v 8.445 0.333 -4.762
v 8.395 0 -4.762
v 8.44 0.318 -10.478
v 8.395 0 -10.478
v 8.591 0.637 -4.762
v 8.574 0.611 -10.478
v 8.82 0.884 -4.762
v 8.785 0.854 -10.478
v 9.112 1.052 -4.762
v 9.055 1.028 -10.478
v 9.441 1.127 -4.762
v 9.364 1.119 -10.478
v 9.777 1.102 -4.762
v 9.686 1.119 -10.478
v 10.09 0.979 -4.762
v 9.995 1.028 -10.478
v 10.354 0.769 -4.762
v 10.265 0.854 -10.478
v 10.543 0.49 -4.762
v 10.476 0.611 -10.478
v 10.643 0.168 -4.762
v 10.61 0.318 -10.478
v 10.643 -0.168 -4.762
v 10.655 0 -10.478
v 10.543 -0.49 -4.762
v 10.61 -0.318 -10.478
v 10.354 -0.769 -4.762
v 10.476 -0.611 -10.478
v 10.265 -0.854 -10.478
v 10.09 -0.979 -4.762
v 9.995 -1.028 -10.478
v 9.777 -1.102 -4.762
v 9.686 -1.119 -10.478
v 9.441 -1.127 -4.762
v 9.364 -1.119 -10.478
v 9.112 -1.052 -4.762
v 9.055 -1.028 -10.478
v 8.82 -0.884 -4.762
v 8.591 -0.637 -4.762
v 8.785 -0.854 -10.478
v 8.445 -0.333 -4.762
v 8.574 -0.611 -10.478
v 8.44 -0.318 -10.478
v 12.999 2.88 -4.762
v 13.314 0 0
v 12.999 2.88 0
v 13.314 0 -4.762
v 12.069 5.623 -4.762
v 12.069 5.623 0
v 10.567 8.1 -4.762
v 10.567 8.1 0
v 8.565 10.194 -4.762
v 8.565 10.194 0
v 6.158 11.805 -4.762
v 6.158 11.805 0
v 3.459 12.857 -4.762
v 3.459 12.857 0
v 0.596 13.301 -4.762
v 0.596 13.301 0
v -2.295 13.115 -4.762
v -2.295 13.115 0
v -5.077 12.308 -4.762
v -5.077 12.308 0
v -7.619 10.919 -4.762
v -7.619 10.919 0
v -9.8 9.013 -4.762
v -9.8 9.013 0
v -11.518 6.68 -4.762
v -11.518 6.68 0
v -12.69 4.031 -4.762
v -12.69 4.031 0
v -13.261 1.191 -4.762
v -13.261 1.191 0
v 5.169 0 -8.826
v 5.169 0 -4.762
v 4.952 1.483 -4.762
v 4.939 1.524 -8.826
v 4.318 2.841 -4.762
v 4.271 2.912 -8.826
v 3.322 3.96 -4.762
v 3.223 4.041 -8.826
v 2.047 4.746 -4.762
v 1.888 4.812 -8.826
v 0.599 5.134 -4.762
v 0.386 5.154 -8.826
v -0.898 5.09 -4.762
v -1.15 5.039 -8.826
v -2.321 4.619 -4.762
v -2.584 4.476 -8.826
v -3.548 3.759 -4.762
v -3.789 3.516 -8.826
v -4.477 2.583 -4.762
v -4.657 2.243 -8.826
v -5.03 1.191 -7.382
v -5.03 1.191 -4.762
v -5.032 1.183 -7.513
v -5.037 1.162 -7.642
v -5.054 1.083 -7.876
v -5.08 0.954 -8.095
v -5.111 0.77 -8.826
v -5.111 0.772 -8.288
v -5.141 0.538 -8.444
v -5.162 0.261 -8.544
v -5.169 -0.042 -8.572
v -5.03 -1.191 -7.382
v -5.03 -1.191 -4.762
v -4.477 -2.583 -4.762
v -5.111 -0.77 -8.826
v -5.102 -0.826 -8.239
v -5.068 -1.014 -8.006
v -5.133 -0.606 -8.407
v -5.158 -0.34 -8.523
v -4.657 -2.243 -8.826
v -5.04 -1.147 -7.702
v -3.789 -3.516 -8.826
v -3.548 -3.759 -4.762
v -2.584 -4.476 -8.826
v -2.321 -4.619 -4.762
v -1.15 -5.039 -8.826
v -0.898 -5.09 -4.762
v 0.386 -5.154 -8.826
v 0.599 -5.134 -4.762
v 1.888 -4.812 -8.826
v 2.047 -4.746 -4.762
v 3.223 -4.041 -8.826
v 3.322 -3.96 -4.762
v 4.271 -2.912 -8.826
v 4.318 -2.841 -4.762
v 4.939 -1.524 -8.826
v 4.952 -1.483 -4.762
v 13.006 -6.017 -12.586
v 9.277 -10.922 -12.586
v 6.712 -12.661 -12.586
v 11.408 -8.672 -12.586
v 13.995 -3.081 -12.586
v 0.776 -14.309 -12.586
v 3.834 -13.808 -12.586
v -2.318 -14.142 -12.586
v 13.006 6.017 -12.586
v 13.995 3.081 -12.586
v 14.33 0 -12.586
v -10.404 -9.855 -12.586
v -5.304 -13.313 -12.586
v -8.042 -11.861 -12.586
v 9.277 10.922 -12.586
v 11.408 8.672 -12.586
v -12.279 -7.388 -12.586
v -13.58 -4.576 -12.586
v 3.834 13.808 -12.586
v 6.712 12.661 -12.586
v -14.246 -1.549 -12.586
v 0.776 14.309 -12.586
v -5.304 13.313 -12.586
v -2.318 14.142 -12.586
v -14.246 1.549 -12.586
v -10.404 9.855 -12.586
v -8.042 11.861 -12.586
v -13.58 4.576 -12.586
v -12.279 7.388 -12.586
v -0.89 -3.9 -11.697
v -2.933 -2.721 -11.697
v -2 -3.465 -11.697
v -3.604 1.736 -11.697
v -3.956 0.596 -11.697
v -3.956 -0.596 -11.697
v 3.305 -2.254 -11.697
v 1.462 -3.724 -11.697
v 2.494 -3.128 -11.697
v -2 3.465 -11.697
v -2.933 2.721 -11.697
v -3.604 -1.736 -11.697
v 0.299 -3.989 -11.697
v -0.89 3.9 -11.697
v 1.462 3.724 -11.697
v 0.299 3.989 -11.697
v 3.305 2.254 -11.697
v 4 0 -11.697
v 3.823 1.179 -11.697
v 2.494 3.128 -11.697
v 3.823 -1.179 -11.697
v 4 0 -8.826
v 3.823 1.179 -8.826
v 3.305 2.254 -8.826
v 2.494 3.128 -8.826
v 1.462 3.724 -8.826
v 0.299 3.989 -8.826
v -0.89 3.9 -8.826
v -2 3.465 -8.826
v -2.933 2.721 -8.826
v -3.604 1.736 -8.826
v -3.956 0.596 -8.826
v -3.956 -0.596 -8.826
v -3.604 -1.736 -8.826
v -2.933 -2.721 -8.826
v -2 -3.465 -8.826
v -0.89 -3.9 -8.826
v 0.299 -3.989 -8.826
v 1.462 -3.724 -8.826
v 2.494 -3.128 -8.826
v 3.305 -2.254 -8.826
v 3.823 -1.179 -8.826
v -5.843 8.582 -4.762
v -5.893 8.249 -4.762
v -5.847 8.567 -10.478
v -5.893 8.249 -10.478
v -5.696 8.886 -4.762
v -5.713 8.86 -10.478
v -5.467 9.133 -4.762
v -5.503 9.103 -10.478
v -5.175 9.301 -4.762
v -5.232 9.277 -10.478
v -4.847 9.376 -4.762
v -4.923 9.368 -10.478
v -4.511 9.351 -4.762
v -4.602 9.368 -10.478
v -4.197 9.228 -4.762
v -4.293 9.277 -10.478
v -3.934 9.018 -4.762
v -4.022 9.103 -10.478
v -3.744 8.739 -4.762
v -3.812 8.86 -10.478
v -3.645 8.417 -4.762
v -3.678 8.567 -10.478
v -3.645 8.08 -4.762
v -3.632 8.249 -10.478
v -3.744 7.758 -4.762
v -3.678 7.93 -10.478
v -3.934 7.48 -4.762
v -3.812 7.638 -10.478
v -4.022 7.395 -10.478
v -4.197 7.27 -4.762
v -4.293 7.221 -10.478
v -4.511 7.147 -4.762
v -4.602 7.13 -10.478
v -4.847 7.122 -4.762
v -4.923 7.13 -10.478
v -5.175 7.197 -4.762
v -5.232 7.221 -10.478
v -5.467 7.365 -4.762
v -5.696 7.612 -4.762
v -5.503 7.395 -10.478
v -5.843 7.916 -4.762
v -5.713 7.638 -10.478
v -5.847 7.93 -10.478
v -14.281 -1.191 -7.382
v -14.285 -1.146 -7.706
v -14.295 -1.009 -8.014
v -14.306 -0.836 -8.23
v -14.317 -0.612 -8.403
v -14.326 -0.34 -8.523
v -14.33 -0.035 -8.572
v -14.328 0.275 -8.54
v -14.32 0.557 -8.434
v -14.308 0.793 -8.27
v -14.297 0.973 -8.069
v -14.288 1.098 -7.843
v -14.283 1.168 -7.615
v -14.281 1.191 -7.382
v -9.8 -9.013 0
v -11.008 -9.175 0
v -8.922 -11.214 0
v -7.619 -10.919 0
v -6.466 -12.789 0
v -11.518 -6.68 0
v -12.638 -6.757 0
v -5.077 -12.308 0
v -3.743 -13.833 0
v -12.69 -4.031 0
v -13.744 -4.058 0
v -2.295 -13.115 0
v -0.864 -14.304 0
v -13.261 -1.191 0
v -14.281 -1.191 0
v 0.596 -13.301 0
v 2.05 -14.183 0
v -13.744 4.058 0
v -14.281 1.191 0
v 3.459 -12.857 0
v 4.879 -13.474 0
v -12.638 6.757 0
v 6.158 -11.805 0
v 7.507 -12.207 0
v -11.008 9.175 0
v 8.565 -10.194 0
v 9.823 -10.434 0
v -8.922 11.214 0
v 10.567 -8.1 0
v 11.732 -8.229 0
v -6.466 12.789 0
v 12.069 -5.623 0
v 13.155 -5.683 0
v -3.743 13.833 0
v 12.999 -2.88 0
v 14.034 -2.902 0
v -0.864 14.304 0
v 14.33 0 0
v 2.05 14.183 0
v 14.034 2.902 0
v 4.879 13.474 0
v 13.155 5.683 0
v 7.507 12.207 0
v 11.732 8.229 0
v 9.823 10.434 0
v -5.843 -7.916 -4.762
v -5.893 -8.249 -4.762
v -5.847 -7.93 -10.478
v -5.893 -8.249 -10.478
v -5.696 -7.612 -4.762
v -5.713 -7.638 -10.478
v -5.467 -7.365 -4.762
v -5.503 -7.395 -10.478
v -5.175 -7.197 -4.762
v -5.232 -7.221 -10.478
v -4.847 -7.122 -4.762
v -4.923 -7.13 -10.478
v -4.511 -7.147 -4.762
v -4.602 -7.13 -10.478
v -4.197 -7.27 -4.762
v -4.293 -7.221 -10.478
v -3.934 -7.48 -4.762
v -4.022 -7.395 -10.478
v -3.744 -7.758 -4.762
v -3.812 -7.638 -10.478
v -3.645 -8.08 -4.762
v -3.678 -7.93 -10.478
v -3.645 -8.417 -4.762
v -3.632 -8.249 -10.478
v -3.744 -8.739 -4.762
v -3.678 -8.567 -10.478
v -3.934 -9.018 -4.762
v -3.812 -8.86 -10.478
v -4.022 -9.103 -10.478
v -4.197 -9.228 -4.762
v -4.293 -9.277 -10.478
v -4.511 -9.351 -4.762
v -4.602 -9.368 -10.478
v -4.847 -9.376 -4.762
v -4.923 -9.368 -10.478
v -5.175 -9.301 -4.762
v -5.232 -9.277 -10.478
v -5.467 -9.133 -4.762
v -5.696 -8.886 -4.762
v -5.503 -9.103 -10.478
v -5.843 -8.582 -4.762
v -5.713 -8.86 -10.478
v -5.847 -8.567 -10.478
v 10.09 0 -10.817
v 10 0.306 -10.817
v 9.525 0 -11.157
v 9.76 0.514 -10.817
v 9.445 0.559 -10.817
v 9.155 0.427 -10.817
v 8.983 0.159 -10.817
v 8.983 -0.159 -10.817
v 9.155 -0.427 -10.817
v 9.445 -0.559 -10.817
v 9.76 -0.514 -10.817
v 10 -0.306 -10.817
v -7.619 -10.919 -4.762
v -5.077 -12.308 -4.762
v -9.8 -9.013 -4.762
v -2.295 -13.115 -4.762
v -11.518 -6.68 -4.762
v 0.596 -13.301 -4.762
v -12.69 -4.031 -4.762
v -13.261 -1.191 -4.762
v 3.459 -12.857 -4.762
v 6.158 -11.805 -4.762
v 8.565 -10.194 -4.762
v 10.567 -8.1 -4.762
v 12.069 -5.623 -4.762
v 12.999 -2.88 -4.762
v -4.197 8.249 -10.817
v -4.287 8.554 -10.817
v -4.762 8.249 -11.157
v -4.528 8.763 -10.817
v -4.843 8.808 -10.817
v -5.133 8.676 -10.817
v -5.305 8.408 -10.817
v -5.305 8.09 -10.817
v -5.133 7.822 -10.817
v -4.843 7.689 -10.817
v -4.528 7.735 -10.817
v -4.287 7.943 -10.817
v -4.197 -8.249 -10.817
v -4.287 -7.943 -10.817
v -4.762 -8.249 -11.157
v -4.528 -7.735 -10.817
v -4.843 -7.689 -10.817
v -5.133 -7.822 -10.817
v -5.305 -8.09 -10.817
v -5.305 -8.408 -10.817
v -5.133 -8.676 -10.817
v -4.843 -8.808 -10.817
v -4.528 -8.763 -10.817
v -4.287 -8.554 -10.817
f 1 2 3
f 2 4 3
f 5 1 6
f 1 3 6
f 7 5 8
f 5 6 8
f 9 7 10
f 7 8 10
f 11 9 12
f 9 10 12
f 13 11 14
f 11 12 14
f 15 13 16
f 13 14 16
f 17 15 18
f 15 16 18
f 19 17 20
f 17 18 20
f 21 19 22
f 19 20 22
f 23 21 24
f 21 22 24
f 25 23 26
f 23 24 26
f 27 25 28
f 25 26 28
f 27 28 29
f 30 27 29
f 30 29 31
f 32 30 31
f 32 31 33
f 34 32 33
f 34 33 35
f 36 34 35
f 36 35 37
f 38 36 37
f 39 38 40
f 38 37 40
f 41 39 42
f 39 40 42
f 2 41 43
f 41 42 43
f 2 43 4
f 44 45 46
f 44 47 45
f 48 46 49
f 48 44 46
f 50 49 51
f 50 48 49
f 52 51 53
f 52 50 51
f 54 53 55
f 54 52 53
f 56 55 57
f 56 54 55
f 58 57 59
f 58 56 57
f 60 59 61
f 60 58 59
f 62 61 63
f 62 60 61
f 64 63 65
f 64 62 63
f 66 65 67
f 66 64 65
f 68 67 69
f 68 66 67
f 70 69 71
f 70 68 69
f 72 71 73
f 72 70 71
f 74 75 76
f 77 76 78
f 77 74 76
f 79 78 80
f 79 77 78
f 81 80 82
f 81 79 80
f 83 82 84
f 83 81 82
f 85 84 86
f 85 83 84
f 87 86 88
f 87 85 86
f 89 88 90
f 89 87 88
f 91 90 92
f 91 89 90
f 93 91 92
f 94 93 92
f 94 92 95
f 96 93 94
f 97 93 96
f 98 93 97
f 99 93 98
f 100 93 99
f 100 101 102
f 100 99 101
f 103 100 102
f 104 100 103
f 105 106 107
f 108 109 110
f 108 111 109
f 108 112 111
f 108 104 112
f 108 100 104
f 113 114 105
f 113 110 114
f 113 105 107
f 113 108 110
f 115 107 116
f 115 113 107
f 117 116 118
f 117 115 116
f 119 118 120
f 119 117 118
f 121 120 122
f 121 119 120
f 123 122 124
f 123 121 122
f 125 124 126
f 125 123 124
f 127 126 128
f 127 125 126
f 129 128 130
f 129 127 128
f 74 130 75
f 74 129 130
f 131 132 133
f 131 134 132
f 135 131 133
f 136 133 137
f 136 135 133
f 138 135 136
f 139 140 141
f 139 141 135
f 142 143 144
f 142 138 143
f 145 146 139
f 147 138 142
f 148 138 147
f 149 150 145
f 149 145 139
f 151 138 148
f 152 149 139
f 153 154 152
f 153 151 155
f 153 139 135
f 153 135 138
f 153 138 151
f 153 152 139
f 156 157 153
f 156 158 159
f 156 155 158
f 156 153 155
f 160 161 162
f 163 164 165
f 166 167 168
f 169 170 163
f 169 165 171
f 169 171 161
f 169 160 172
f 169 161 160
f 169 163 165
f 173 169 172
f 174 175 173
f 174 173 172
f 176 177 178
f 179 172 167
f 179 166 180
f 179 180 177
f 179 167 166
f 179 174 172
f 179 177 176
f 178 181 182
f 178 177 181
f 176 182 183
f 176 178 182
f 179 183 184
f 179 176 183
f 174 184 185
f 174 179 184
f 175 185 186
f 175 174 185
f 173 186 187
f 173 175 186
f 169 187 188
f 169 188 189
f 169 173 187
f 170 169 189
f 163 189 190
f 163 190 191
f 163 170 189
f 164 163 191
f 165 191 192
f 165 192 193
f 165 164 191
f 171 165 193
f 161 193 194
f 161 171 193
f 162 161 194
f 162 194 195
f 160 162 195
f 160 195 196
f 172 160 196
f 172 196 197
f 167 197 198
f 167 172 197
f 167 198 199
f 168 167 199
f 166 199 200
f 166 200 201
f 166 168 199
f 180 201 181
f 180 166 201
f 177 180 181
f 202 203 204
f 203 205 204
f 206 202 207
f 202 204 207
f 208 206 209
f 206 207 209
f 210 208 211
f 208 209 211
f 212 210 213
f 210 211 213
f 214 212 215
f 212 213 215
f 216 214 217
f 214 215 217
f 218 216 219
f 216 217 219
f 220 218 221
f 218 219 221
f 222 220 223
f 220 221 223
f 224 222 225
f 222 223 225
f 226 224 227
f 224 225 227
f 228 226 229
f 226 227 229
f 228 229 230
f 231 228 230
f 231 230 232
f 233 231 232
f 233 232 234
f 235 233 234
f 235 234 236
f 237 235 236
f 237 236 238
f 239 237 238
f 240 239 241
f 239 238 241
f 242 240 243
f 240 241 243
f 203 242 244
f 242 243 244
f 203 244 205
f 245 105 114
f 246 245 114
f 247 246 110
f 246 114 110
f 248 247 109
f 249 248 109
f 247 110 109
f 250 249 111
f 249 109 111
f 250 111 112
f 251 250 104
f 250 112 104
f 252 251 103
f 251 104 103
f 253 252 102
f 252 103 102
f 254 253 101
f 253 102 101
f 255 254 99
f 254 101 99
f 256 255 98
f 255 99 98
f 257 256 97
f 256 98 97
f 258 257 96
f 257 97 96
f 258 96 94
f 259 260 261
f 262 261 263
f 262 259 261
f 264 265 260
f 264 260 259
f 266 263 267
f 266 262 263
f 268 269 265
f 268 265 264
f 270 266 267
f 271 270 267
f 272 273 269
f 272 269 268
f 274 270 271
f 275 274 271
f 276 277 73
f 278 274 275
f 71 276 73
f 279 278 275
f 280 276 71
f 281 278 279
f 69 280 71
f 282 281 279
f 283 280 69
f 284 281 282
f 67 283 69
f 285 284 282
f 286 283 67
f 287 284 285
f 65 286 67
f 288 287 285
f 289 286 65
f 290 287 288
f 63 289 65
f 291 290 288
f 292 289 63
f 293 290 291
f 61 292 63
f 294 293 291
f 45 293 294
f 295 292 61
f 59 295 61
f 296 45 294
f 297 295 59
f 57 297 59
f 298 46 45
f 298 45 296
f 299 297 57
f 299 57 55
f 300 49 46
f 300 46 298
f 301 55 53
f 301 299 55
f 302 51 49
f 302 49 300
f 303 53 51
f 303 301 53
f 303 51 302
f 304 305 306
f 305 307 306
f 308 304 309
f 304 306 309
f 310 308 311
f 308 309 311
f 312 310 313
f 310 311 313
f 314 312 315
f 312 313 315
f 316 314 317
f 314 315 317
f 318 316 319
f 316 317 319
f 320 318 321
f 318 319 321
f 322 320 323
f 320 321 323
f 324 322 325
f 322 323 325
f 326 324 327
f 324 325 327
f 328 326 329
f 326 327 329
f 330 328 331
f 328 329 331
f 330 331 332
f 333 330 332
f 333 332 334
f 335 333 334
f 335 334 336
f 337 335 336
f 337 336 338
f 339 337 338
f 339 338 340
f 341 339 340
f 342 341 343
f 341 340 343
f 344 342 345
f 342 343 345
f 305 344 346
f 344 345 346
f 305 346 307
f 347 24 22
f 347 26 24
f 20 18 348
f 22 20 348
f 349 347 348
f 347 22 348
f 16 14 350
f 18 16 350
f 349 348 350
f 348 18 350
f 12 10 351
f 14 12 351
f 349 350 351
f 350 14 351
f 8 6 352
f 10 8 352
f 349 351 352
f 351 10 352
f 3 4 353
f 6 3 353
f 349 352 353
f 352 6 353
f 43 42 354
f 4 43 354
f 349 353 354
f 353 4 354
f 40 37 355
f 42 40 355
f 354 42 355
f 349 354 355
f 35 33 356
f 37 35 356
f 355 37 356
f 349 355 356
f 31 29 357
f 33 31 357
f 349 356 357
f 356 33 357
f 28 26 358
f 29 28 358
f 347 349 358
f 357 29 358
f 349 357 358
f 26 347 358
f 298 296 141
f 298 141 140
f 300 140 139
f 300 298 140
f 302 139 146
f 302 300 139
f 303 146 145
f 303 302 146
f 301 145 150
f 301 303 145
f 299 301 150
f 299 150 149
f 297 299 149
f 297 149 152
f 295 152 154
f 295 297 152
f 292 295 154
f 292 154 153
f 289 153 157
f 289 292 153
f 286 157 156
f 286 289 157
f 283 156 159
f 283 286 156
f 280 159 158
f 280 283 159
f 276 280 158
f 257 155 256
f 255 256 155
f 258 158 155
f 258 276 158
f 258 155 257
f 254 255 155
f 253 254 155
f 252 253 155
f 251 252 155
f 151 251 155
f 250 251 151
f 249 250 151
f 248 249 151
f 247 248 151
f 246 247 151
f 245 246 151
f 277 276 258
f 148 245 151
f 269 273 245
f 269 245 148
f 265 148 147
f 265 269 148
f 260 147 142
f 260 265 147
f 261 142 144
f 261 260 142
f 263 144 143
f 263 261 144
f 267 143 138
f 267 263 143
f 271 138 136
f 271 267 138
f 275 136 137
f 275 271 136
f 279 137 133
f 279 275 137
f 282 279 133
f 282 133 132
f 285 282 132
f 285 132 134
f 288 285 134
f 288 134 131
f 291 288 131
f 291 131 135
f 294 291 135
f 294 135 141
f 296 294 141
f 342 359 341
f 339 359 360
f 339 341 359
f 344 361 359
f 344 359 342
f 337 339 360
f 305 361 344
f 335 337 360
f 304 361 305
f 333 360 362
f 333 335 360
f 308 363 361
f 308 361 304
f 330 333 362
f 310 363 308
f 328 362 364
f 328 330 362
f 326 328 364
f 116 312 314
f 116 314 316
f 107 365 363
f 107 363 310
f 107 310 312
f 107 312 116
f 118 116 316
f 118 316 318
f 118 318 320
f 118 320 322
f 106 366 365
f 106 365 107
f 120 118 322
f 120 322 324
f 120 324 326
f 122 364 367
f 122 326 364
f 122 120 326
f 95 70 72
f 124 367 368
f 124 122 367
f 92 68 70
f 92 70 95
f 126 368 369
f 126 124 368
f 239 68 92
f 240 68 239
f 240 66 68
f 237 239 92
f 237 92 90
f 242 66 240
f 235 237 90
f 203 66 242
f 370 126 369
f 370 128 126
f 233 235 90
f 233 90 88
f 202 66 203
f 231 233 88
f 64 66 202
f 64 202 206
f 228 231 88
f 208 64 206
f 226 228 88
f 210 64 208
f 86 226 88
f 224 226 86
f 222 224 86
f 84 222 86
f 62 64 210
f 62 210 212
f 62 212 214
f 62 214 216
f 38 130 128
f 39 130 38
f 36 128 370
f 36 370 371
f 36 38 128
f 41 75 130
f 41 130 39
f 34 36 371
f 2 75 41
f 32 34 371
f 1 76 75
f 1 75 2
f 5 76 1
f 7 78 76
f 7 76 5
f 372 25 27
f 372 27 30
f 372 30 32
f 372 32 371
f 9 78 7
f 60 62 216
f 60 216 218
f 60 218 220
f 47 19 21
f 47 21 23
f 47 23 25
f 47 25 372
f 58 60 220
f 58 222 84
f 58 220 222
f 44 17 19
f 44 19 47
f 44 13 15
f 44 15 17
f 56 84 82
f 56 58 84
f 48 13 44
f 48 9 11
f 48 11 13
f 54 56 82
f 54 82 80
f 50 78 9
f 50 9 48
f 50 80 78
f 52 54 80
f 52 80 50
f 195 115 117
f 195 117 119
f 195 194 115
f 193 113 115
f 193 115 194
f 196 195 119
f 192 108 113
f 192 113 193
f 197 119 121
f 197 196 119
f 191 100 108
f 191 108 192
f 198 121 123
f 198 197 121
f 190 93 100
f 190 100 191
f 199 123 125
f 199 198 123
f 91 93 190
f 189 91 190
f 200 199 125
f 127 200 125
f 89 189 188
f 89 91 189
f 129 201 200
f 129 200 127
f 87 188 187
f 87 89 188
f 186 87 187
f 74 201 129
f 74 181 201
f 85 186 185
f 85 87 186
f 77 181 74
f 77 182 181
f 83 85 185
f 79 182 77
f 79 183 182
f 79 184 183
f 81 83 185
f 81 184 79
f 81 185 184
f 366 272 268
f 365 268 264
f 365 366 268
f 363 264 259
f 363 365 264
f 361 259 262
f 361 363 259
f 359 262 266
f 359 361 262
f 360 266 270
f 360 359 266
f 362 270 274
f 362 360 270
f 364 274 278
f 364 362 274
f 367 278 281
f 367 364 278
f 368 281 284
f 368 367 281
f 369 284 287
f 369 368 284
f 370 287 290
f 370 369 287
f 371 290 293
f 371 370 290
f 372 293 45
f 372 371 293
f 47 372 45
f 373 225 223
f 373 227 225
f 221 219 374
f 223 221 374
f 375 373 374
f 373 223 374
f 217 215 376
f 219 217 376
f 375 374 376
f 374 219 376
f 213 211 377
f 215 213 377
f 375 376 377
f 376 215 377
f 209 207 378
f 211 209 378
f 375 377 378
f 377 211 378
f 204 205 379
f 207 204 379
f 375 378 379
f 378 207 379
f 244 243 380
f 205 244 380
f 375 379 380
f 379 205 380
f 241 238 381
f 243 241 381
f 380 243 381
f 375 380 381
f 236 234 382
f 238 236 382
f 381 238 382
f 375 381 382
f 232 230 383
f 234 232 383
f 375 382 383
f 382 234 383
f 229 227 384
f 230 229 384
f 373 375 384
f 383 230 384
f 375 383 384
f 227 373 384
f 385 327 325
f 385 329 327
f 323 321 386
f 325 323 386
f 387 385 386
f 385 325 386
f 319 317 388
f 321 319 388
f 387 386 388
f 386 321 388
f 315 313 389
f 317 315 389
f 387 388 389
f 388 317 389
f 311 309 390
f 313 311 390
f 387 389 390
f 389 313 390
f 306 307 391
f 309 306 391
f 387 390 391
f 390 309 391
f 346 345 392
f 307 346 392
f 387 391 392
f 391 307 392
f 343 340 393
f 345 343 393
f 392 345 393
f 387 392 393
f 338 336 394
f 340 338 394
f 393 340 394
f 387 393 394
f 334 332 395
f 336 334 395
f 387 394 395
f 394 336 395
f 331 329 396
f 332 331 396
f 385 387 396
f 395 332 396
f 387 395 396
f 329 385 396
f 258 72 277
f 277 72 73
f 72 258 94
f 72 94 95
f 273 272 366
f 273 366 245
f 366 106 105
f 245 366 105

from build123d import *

# Parameters (mm, degrees)
F3_DEPTH = 25.4
F5_D     = 2.2606
F5_DEPTH = 5.715
F5_TIP   = 0.6791527577


with BuildPart() as f1:
    # F0 (on Front) → F1 (revolve)
    with BuildSketch(Plane.XZ):
        Polygon((14.330415332, -12.5857), (14.330415332, 0), (13.314415332, 0), (13.314415332, -4.7625), (5.1689, -4.7625), (5.1689, -8.8265), (4.0005, -8.8265), (4.0005, -11.6967), (0, -11.6967), (0, -12.5857), align=None)
    revolve(axis=Axis((0, 0, -12.1412), (0, 0, 1)))

    # F2 (on Right) → F3 (cut)
    with BuildSketch(Plane.YZ):
        with BuildLine():
            Line((-1.190625, 0), (-1.190625, -7.381875))
            ThreePointArc((-1.190625, -7.381875), (0, -8.5725), (1.190625, -7.381875))
            Line((1.190625, -7.381875), (1.190625, 0))
            Line((1.190625, 0), (-1.190625, 0))
        make_face()
    extrude(amount=-F3_DEPTH, mode=Mode.SUBTRACT)

    # F5
    with Locations(Plane.XY.offset(-4.7625)):
        with Locations((9.525, 0), (-4.7625, 8.248891971), (-4.7625, -8.248891971)):
            Hole(F5_D / 2, depth=F5_DEPTH)
            with Locations((0, 0, -(F5_DEPTH + F5_TIP / 2))):  # 118° drill point
                Cone(0, F5_D / 2, F5_TIP, mode=Mode.SUBTRACT)


solid = f1.part
